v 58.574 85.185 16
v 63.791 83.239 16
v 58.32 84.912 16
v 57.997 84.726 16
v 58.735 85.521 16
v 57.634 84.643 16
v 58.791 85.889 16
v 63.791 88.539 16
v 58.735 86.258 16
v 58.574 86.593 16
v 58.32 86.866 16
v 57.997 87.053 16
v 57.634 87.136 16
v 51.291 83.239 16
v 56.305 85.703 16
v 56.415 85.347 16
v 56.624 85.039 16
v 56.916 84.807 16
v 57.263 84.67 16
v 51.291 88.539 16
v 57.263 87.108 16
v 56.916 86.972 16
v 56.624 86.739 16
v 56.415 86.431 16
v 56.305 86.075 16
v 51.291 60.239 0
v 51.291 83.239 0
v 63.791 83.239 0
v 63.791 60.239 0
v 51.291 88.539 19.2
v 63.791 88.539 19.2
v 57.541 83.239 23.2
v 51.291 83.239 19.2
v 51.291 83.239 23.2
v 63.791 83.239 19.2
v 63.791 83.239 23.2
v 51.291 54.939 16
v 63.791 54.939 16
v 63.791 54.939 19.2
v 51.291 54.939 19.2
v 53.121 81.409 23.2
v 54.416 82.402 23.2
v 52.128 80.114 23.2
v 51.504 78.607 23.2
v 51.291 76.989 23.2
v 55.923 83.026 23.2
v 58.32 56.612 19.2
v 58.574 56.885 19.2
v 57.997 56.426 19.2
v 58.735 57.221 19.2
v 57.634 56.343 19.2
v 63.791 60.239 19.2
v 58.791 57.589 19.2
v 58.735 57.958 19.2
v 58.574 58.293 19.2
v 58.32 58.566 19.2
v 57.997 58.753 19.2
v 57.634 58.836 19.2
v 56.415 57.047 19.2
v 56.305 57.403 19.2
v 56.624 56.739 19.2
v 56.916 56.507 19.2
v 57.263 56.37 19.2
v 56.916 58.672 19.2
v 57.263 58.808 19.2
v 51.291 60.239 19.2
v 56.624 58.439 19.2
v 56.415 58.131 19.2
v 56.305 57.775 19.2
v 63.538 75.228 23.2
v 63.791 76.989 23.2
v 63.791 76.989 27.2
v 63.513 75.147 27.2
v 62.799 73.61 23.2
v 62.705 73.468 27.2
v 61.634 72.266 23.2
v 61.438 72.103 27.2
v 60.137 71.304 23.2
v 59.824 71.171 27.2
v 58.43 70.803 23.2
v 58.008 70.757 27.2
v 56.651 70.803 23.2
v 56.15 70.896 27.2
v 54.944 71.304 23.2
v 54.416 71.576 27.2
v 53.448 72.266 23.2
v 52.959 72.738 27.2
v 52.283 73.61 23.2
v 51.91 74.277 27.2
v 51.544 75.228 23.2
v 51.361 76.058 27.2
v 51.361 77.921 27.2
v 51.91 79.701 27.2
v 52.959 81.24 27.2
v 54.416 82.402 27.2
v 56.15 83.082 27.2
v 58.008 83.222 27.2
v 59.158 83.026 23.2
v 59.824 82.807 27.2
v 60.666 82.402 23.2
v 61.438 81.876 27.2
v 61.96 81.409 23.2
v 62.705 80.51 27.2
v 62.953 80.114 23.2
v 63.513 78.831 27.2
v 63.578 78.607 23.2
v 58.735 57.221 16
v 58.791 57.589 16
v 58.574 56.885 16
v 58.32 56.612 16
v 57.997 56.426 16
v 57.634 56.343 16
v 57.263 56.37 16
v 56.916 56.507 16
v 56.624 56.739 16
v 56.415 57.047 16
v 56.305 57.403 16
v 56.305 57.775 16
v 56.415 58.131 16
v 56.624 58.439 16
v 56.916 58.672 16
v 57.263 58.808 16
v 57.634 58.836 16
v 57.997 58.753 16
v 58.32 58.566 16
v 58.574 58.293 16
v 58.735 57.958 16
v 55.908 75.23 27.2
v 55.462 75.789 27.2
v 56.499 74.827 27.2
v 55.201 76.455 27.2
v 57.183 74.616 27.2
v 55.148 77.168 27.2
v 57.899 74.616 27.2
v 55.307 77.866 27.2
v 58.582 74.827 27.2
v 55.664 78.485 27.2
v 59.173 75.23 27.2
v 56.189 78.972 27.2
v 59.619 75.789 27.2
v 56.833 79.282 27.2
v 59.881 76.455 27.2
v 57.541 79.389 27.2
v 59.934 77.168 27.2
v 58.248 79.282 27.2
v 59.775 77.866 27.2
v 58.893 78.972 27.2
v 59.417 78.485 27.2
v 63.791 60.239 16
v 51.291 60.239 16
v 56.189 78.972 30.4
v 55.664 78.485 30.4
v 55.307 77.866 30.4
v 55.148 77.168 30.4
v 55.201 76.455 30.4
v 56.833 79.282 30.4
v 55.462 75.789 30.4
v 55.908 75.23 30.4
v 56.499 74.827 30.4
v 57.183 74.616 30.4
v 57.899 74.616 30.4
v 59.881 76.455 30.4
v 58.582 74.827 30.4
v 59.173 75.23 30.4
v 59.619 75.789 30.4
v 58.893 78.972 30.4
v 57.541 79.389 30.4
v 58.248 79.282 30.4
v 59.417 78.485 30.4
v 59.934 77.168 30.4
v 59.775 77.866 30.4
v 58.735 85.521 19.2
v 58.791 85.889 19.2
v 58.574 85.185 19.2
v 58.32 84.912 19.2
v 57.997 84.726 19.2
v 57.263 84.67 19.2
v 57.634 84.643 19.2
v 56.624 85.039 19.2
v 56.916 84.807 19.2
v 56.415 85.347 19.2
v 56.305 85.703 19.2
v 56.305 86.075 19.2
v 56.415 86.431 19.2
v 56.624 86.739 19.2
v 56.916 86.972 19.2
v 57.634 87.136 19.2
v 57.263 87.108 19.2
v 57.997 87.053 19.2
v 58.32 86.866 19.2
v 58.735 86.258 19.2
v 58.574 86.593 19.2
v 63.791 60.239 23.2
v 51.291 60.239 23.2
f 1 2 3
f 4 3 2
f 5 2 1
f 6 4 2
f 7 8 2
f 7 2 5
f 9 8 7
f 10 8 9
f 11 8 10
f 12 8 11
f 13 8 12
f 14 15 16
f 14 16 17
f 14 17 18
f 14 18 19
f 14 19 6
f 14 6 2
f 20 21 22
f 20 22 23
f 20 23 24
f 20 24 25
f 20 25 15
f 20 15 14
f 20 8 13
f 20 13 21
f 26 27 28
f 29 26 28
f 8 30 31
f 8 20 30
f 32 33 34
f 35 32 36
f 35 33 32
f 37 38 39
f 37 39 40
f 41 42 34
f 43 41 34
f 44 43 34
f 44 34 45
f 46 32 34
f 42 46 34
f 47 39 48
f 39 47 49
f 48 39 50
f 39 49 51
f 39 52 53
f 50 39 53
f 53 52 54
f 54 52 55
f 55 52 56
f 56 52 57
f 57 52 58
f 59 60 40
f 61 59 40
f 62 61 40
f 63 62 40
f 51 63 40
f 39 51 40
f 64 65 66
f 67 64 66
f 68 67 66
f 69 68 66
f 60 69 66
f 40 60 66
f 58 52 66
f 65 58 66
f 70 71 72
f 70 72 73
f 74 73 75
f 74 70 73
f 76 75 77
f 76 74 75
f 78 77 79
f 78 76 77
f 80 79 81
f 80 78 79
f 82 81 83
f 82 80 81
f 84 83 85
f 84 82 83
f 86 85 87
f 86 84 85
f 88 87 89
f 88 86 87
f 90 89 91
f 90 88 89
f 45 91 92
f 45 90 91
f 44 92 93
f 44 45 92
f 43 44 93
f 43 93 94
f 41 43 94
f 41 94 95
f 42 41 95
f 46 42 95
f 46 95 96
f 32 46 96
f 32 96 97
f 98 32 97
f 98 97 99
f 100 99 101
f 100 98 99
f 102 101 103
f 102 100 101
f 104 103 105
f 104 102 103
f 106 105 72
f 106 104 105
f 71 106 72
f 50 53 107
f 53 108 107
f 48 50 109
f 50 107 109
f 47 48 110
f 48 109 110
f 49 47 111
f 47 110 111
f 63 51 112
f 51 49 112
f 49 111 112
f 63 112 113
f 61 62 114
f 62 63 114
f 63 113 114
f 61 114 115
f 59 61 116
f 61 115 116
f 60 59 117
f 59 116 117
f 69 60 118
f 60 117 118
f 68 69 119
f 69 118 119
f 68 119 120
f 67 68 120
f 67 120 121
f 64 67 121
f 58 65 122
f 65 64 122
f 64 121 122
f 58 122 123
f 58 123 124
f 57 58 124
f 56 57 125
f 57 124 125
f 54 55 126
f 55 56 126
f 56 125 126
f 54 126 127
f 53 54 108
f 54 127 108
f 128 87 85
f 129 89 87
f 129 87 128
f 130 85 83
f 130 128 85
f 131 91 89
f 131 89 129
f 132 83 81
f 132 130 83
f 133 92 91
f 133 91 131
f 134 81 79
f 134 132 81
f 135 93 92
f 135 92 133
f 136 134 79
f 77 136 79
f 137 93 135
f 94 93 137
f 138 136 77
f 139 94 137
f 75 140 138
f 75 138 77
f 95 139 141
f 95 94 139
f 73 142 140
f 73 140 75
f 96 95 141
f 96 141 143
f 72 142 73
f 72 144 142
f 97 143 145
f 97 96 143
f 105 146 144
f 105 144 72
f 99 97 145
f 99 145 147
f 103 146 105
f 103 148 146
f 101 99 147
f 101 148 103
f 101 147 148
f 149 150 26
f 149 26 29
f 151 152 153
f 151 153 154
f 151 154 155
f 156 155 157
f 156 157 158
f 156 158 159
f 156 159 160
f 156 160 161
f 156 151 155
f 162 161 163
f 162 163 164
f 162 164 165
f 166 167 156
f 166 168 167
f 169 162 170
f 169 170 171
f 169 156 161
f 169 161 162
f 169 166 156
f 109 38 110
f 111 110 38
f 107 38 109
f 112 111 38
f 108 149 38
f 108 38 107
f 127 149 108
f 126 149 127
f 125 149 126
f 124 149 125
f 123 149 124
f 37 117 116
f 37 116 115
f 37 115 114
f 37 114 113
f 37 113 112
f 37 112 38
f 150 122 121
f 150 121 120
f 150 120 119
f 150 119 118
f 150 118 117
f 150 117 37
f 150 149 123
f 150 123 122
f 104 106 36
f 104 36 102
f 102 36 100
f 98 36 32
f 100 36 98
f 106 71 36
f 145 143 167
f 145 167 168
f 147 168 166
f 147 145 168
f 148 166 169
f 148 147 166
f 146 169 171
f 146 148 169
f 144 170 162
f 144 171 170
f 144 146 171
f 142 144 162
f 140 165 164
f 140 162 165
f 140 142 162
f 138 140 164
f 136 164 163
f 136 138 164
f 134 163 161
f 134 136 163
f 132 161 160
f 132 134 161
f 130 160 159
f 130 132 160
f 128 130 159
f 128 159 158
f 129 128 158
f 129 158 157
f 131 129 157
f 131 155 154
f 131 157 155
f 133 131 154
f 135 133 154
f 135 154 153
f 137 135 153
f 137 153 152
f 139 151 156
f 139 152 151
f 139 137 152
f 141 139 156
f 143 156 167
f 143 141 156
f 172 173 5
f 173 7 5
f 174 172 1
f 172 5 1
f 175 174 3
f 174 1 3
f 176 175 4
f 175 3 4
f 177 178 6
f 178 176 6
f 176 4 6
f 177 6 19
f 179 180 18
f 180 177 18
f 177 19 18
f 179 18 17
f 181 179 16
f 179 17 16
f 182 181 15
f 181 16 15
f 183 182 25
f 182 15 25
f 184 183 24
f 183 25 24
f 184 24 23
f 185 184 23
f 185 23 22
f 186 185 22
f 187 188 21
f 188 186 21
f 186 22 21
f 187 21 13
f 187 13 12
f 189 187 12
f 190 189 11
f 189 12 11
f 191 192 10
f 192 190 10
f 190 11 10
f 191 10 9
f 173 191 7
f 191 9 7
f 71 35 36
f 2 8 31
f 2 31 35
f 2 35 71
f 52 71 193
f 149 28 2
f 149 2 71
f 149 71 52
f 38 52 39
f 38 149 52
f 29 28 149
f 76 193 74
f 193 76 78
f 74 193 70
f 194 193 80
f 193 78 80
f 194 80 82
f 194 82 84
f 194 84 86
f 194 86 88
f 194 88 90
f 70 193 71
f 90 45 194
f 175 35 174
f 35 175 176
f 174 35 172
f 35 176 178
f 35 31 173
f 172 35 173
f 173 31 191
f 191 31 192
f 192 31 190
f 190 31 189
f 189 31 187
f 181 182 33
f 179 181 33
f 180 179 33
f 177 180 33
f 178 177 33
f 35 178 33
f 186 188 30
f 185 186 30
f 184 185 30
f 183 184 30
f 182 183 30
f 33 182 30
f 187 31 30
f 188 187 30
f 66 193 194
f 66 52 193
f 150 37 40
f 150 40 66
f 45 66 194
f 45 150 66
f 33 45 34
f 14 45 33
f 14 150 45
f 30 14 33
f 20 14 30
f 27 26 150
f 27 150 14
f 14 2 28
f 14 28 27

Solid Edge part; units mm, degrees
sketch "Sketch1" plane through (0, 0, 0) normal (0, 0, 1) x (1, 0, 0)
  line L0 (51.2908, 60.2391) -> (63.7908, 60.2391)
  line L1 (63.7908, 60.2391) -> (63.7908, 83.2391)
  line L2 (63.7908, 83.2391) -> (51.2908, 83.2391)
  line L3 (51.2908, 83.2391) -> (51.2908, 60.2391)
extrude "Protrusion1" add sketch "Sketch1" along normal blind 16
sketch "Sketch2" plane through (57.5408, 71.7391, 16) normal (0, 0, 1) x (1, 0, 0)
  circle A0 centre (0, 14.15) radius 1.25
  circle A1 centre (0, -14.15) radius 1.25
  line L0 (-6.25, 16.8) -> (6.25, 16.8)
  line L1 (6.25, 16.8) -> (6.25, -16.8)
  line L2 (6.25, -16.8) -> (-6.25, -16.8)
  line L3 (-6.25, -16.8) -> (-6.25, 16.8)
extrude "flange" add sketch "Sketch2" along normal blind 3.2
sketch "Sketch3" plane through (57.5408, 71.7391, 19.2) normal (0, 0, 1) x (1, 0, 0)
  line L0 (-6.25, 11.5) -> (6.25, 11.5)
  line L1 (6.25, 11.5) -> (6.25, -11.5)
  line L2 (6.25, -11.5) -> (-6.25, -11.5)
  line L3 (-6.25, -11.5) -> (-6.25, 11.5)
extrude "top" add sketch "Sketch3" along normal blind 4
sketch "Sketch4" plane through (57.5408, 71.7391, 23.2) normal (0, 0, 1) x (1, 0, 0)
  circle A0 centre (0, 5.25) radius 6.25
extrude "ExtrudedProtrusion_4" add sketch "Sketch4" along normal blind 4
sketch "Sketch5" plane through (57.5408, 76.9891, 27.2) normal (0, 0, 1) x (0, 1, 0)
  circle A0 centre (0, 0) radius 2.4
extrude "ExtrudedProtrusion_5" add sketch "Sketch5" along normal blind 3.2
